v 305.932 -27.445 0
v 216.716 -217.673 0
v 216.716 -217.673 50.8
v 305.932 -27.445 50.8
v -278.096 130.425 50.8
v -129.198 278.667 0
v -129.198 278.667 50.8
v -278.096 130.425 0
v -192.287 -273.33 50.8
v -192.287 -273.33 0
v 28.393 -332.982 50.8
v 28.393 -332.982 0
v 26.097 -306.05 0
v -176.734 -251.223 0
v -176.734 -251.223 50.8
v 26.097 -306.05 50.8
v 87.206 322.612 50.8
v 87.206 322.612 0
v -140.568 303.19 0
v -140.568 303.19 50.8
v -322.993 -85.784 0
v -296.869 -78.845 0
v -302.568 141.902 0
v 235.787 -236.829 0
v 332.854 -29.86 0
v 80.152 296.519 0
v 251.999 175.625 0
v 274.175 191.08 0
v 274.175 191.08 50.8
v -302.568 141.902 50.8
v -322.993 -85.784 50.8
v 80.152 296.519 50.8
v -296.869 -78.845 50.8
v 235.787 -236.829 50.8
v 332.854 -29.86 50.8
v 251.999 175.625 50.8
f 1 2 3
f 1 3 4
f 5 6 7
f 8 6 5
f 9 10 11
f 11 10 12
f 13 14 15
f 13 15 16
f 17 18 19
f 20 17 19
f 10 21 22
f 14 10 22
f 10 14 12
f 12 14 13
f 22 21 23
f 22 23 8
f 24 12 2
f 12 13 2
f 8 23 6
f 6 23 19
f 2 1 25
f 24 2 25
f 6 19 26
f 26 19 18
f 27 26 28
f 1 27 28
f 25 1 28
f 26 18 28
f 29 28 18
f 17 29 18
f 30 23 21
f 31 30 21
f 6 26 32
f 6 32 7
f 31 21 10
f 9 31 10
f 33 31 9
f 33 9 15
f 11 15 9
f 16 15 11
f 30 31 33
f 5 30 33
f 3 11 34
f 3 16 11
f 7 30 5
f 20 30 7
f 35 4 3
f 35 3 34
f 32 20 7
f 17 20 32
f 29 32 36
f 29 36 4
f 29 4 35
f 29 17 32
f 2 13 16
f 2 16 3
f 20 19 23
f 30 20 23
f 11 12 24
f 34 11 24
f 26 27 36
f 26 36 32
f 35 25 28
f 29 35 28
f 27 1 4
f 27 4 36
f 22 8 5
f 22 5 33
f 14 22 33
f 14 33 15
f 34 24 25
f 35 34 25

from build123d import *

# Parameters (mm, degrees)
F1_DEPTH = 50.8
F2_T     = -25.4


with BuildPart() as f1:
    # F0 (on Top) → F1 (new body)
    with BuildSketch(Plane.XY):
        Polygon((87.205826, 322.612249), (-140.567618, 303.190145), (-302.567911, 141.902003), (-322.993317, -85.783664), (-192.286559, -273.330201), (28.393216, -332.982499), (235.78749, -236.828586), (332.854177, -29.859945), (274.174695, 191.080496), align=None)
    extrude(amount=F1_DEPTH)

    # F2
    f2_openings = [f1.faces().sort_by_distance(p)[0] for p in [
        (0, 0, 0),
        (0, 0, 50.8),
    ]]
    offset(amount=F2_T, openings=f2_openings)


solid = f1.part
